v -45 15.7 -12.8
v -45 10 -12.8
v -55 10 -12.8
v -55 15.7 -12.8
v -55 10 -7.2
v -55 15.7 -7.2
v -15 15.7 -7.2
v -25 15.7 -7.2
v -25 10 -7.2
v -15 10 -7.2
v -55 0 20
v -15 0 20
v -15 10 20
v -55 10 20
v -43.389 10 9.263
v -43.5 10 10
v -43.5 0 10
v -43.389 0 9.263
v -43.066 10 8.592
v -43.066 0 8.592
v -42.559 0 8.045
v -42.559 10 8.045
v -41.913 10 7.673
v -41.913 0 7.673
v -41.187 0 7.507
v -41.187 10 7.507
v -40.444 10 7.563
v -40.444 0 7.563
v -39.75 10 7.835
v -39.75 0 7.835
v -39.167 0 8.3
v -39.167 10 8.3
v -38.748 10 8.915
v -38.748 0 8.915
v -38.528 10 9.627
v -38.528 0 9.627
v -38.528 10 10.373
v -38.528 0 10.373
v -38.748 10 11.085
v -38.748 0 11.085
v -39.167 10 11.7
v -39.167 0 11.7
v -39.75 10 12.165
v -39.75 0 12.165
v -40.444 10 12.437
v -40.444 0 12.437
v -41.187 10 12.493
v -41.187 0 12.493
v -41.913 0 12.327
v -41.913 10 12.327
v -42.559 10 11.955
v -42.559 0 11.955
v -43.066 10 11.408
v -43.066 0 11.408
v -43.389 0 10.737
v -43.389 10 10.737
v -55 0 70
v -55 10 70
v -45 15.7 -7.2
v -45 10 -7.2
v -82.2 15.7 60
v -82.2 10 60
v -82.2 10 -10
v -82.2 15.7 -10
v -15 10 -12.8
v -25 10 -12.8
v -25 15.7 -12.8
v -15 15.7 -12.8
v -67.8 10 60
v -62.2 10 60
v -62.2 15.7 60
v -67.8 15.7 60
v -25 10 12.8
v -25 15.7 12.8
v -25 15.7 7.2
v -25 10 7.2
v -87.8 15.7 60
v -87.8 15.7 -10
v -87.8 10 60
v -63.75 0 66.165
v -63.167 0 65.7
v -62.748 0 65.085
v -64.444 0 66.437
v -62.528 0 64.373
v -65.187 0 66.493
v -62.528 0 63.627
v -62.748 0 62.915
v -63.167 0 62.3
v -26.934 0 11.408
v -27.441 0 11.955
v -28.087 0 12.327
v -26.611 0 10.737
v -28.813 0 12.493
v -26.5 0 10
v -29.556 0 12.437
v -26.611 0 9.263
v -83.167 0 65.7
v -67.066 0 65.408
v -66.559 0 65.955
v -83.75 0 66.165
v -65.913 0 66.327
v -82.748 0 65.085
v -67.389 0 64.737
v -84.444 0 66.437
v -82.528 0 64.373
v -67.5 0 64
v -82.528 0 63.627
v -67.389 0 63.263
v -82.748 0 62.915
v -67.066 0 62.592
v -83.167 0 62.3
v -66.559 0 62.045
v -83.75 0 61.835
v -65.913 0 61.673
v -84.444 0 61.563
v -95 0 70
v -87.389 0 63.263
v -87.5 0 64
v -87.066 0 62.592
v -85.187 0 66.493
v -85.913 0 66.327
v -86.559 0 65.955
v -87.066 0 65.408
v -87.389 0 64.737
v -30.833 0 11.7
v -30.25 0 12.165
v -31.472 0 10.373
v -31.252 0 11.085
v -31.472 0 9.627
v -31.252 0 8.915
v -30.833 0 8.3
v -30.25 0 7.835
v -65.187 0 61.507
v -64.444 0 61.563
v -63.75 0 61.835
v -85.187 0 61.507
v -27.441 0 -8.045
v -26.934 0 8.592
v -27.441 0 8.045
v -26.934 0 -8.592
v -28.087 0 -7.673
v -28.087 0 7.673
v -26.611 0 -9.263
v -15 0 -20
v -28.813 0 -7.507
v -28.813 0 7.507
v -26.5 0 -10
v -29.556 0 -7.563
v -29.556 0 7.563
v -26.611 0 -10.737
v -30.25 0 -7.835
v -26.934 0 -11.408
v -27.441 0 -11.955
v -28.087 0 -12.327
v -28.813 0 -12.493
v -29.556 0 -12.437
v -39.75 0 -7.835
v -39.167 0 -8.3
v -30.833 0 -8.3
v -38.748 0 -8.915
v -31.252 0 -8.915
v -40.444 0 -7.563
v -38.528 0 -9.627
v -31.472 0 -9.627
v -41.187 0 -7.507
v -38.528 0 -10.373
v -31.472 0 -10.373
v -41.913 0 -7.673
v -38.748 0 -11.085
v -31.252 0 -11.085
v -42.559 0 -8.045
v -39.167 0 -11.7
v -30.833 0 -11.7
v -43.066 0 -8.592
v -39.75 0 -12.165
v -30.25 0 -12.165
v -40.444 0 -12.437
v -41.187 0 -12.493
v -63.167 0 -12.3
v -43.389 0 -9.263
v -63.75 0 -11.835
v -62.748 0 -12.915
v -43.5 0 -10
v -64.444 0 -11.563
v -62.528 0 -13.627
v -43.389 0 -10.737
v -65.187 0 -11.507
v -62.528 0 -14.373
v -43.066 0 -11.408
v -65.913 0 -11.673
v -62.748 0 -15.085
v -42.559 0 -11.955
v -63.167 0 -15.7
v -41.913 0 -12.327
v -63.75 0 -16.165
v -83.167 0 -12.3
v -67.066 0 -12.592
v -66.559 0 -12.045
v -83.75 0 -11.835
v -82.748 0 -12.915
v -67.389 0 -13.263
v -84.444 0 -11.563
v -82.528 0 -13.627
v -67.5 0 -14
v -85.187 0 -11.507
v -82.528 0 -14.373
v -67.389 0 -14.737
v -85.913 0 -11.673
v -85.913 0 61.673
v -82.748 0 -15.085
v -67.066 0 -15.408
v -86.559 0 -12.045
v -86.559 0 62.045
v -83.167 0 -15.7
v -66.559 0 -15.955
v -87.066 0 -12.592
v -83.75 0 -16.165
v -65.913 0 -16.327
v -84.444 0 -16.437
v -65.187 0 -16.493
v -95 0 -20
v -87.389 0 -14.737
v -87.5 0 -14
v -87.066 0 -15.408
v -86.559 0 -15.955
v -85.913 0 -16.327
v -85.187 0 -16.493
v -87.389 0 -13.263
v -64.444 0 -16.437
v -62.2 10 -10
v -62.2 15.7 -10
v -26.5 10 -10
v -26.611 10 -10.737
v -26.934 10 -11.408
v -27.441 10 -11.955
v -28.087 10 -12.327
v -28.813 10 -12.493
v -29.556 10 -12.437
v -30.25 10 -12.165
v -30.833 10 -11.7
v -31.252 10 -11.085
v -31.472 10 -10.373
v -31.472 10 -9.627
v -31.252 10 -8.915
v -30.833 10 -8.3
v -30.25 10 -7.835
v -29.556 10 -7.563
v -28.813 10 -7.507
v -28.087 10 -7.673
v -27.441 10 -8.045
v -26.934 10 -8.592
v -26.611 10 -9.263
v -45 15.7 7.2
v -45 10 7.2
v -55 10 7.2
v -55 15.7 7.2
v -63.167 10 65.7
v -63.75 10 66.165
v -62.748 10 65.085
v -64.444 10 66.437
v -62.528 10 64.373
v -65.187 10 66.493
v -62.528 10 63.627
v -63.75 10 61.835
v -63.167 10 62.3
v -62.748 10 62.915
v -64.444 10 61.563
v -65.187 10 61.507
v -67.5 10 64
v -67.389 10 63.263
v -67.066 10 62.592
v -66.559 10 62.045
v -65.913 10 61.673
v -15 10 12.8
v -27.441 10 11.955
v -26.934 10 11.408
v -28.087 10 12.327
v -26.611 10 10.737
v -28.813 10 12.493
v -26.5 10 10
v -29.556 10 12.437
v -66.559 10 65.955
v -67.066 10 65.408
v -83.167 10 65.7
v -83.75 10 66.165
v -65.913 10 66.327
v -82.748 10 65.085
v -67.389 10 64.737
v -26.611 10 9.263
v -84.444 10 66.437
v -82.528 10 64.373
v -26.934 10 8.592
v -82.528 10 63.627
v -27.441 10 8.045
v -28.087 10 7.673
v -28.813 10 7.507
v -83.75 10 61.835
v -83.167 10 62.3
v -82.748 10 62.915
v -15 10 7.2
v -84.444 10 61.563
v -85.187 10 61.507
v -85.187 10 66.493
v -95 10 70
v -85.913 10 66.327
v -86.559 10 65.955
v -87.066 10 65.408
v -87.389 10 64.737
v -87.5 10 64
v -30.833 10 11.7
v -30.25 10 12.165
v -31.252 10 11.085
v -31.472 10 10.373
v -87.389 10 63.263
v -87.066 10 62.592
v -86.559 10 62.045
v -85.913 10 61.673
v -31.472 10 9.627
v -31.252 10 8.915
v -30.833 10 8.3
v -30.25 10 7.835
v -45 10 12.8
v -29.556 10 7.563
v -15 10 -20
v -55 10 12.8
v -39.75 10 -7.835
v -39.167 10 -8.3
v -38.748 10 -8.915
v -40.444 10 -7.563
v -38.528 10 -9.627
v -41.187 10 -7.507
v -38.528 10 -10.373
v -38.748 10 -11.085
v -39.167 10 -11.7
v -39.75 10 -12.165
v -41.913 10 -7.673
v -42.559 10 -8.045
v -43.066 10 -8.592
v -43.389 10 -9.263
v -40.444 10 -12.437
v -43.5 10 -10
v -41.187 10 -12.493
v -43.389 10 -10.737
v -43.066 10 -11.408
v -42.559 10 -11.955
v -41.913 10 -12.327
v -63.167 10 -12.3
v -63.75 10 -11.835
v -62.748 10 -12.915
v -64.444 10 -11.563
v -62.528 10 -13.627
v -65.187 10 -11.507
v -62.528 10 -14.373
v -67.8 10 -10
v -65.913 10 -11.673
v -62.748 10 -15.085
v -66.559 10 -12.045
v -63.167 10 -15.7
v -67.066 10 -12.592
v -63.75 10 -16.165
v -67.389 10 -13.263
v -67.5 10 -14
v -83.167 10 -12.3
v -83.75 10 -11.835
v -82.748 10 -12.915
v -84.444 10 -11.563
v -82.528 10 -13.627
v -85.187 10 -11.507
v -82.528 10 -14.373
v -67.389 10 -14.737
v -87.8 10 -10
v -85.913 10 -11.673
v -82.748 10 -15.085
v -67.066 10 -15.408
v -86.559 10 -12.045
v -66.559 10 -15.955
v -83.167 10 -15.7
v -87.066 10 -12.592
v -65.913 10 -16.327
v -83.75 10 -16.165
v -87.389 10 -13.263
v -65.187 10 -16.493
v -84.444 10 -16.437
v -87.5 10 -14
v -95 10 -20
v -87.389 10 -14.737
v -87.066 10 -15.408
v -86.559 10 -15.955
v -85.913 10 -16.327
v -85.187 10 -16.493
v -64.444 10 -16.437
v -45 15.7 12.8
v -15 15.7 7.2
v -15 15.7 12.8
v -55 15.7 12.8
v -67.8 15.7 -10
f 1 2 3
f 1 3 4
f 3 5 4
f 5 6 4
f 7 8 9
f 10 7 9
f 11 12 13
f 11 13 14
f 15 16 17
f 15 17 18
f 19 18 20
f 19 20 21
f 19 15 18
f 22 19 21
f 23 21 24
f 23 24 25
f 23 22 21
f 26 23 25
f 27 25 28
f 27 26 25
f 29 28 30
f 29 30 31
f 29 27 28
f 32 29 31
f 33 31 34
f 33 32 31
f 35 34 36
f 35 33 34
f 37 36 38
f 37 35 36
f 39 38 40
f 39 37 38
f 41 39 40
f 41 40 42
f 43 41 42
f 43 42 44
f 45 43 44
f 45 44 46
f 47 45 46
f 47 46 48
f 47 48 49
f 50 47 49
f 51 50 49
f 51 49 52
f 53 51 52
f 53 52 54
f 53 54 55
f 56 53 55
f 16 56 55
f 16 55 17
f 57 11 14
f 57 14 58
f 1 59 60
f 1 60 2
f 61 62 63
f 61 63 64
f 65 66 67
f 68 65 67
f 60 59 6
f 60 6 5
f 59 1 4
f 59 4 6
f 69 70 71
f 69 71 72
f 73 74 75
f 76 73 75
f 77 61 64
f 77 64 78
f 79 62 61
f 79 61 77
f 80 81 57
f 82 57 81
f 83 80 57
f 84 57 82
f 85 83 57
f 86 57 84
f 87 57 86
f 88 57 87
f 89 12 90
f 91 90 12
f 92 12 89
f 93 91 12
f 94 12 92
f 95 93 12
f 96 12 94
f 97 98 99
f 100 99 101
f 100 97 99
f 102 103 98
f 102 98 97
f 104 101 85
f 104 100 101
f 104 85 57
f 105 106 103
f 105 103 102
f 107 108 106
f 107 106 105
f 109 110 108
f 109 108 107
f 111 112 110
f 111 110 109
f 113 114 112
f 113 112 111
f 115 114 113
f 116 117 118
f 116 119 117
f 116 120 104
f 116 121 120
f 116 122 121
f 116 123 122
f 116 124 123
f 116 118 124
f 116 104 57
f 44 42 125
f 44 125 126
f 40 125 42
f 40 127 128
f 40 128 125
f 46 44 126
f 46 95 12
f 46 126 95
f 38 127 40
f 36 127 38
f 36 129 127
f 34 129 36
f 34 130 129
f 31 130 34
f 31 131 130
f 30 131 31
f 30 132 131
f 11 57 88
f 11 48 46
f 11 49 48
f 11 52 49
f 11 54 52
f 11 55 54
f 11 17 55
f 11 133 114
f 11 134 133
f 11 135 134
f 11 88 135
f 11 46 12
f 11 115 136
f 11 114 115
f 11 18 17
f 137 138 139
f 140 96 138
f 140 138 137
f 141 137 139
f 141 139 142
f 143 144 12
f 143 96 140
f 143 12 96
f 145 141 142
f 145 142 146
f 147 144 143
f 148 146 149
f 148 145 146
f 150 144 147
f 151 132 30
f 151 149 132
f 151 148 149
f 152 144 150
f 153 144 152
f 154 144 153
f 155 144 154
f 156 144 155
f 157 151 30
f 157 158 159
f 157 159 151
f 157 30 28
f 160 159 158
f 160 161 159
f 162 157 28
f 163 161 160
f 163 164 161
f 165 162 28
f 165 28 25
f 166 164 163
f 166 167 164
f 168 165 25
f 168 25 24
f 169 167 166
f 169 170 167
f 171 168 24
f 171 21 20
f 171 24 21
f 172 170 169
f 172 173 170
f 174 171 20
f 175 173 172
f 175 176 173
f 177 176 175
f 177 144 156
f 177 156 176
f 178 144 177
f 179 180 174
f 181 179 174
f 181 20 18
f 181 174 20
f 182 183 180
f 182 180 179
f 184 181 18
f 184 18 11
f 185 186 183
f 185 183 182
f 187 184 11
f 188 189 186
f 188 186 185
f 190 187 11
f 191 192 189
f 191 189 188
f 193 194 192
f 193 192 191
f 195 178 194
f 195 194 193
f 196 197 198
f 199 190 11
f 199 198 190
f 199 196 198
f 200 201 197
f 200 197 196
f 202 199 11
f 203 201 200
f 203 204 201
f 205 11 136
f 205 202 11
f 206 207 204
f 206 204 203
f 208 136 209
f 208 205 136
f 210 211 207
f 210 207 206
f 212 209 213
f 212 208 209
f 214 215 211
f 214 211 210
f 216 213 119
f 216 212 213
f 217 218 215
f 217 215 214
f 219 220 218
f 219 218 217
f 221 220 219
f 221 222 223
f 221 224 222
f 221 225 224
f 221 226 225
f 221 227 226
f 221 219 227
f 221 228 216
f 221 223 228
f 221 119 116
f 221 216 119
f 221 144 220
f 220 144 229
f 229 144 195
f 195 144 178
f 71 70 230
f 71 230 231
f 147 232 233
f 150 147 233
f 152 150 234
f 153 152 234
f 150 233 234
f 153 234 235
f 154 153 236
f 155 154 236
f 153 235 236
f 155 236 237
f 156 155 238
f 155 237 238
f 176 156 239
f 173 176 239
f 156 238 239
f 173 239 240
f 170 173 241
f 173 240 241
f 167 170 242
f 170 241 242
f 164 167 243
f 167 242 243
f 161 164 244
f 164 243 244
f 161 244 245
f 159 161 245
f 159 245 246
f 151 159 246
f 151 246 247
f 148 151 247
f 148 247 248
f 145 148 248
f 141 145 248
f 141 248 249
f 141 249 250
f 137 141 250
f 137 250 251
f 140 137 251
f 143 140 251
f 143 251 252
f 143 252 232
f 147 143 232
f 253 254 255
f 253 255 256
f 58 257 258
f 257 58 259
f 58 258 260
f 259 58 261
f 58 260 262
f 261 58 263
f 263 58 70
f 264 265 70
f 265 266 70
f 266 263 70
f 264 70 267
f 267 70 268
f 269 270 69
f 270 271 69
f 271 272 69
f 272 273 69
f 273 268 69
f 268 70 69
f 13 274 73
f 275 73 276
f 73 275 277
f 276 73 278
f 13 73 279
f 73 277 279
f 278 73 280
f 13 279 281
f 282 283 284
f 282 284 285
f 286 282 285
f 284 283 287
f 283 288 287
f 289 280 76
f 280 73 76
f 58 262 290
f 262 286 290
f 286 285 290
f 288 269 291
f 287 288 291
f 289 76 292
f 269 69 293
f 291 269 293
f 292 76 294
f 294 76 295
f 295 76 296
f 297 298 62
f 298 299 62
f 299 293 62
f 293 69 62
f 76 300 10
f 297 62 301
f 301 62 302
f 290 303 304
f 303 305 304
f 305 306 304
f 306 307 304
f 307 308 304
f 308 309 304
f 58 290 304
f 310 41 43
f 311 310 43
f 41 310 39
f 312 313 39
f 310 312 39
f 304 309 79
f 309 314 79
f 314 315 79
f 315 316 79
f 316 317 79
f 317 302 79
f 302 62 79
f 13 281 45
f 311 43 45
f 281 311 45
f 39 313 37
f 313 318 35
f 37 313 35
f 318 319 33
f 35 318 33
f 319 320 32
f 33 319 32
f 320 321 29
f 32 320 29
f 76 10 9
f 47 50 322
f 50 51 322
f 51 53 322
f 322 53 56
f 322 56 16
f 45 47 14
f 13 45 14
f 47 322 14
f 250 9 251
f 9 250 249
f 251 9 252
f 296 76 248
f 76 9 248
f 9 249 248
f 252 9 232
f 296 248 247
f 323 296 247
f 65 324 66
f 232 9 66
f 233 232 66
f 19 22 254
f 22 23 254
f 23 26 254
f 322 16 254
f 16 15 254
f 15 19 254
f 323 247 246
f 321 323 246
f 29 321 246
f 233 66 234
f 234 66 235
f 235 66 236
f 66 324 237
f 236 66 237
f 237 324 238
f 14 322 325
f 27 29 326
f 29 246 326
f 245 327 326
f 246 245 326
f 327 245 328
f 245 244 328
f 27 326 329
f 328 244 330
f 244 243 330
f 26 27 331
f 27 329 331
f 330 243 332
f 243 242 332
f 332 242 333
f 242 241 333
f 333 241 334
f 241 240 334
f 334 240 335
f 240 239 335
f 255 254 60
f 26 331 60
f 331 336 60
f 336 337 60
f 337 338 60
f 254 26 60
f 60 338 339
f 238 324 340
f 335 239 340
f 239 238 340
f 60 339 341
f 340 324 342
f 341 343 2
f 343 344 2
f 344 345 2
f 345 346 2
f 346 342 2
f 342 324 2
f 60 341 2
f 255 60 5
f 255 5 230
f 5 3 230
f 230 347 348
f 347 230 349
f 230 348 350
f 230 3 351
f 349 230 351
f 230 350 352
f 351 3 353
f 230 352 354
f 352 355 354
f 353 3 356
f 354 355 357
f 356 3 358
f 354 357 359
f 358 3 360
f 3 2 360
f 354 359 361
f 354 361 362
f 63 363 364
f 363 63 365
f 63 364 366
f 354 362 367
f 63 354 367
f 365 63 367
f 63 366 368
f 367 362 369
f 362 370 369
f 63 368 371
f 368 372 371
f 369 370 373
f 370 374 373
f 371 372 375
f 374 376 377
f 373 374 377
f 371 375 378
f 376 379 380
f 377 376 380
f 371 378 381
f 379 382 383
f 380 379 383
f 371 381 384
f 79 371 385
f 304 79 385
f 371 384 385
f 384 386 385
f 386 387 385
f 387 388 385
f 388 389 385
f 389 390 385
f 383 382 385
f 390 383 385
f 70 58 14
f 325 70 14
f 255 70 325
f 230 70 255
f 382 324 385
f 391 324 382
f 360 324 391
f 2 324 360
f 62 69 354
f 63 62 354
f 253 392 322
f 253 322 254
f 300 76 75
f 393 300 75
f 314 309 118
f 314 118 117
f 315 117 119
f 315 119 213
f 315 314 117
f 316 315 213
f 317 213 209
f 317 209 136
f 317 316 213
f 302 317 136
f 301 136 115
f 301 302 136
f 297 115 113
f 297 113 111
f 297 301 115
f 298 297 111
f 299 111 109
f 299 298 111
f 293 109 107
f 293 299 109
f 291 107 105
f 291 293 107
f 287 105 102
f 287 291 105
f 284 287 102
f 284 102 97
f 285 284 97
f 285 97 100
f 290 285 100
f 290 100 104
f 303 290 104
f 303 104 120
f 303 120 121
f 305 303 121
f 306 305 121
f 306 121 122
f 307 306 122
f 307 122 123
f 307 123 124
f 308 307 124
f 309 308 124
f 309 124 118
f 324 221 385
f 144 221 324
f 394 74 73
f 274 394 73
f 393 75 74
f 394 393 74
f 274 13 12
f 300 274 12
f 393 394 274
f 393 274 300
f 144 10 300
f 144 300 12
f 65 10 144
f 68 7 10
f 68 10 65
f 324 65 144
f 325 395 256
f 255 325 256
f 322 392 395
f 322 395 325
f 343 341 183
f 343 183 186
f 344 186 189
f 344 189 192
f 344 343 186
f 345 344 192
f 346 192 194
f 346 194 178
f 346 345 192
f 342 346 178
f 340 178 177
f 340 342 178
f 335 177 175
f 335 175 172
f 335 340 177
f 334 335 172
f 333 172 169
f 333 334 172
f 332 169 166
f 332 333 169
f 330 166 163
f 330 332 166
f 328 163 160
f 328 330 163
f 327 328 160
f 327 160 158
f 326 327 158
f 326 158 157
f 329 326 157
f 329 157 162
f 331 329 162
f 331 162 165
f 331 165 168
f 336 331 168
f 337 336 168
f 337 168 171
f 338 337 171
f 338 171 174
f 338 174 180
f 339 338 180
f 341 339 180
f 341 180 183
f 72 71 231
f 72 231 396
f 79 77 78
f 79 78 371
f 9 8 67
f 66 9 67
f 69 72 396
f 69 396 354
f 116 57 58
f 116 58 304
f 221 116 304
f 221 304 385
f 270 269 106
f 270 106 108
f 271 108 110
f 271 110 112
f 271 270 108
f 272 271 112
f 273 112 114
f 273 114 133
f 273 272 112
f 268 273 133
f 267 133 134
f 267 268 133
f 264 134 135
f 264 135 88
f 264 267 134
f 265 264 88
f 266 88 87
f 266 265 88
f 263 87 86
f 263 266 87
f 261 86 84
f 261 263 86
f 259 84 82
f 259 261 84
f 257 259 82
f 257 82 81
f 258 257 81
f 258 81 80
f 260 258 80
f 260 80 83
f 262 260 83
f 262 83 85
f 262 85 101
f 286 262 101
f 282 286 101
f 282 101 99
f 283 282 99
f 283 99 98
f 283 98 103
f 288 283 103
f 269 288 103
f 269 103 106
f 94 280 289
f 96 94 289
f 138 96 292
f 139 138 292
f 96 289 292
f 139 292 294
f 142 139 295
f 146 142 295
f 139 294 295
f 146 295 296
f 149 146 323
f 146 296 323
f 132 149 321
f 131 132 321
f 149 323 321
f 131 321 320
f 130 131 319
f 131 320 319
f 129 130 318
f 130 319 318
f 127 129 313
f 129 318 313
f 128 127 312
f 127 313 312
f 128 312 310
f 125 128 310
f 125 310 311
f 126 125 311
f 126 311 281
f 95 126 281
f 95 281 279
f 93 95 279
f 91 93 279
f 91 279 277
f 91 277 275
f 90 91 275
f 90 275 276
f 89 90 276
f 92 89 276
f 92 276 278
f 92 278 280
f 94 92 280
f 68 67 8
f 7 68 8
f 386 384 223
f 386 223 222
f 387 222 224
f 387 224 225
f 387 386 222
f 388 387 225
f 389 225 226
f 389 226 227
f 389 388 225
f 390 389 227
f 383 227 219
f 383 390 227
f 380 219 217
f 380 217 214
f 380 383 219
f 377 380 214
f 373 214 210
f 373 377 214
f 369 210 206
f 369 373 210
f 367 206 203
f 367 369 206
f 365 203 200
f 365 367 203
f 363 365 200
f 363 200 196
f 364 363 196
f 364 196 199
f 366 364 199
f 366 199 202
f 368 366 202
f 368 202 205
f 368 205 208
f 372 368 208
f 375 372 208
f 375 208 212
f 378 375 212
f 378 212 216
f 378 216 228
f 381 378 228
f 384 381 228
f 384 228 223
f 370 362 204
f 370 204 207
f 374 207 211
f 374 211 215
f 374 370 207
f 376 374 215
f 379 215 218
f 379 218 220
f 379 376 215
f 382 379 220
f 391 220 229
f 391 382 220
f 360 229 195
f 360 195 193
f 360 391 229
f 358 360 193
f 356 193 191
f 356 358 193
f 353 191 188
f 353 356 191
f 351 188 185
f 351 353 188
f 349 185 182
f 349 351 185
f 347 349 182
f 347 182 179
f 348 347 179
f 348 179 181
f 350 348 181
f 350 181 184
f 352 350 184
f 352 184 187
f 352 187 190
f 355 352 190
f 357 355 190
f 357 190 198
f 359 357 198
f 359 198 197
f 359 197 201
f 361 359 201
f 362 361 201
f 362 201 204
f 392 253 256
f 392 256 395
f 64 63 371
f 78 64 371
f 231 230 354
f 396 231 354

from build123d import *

# Parameters (mm, degrees)
SALIENTE_EXTRUIR1_DEPTH = 10
SALIENTE_EXTRUIR2_DEPTH = 90
SALIENTE_EXTRUIR3_DEPTH = 50
CROQUIS6_W              = 56.928573576
CROQUIS6_H              = 55.923287038
CORTAR_EXTRUIR2_DEPTH   = 30
CROQUIS5_W              = 40
CROQUIS5_H              = 10
CROQUIS5_W_2            = 10
CROQUIS5_H_2            = 40
CORTAR_EXTRUIR1_DEPTH   = 5.7
CROQUIS7_R              = 2.5
CORTAR_EXTRUIR3_DEPTH   = 11
SKETCH1_W               = 156.521822712
SKETCH1_H               = 40.193765496
CUT_EXTRUDE1_DEPTH      = 40


with BuildPart() as part:
    # Croquis1 → Saliente-Extruir1 (new body)
    with BuildSketch(Plane(origin=(0, 0, 0), x_dir=(1, 0, 0), z_dir=(0, 1, 0))):
        Polygon((25, 20), (-65, 20), (-65, -20), (-15, -20), (-15, -70), (25, -70), (25, -20), align=None)
    extrude(amount=SALIENTE_EXTRUIR1_DEPTH)

    # Croquis2 → Saliente-Extruir2 (add, through all)
    with BuildSketch(Plane.XY.offset(70)):
        Polygon((12.2, 9.987376579), (12.2, 15.7), (17.8, 15.7), (17.8, 9.987376579), (15, 9.987376579), align=None)
        Polygon((-7.8, 9.987376579), (-7.8, 15.7), (-2.2, 15.7), (-2.2, 9.987376579), (-5, 9.987376579), align=None)
    extrude(amount=-SALIENTE_EXTRUIR2_DEPTH)

    # Croquis3 → Saliente-Extruir3 (add)
    with BuildSketch(Plane.ZY.offset(65)):
        Polygon((7.2, 10), (7.2, 15.7), (12.8, 15.7), (12.8, 10), (10, 10), align=None)
        Polygon((-12.8, 10), (-12.8, 15.7), (-7.2, 15.7), (-7.2, 10), (-10, 10), align=None)
    extrude(amount=-SALIENTE_EXTRUIR3_DEPTH)

    # Croquis6 → Cortar-Extruir2 (cut)
    with BuildSketch(Plane.ZY.offset(65)):
        Rectangle(CROQUIS6_W, CROQUIS6_H)
    extrude(amount=-CORTAR_EXTRUIR2_DEPTH, mode=Mode.SUBTRACT)

    # Croquis5 → Cortar-Extruir1 (cut)
    with BuildSketch(Plane(origin=(0, 15.7, 0), x_dir=(1, 0, 0), z_dir=(0, 1, 0))):
        with Locations((5, -65)):
            Rectangle(CROQUIS5_W, CROQUIS5_H)
        with Locations((5, 15)):
            Rectangle(CROQUIS5_W, CROQUIS5_H)
        with Locations((-30, 0)):
            Rectangle(CROQUIS5_W_2, CROQUIS5_H_2)
    extrude(amount=-CORTAR_EXTRUIR1_DEPTH, mode=Mode.SUBTRACT)

    # Croquis7 → Cortar-Extruir3 (cut, through all)
    with BuildSketch(Plane(origin=(0, 10, 0), x_dir=(1, 0, 0), z_dir=(0, 1, 0))):
        with Locations((-29, 10)):
            Circle(CROQUIS7_R)
        with Locations((-29, -10)):
            Circle(CROQUIS7_R)
        with Locations((15, 14)):
            Circle(CROQUIS7_R)
        with Locations((-5, 14)):
            Circle(CROQUIS7_R)
        with Locations((-5, -64)):
            Circle(CROQUIS7_R)
        with Locations((15, -64)):
            Circle(CROQUIS7_R)
    extrude(amount=-CORTAR_EXTRUIR3_DEPTH, mode=Mode.SUBTRACT)

    # Mirror1: part across plane


with BuildPart() as part_1:
    add(part.part)
    add(part.part.mirror(Plane.ZY.offset(35)))

    # Sketch1 → Cut-Extrude1 (cut)
    with BuildSketch(Plane(origin=(25, 0, 0), x_dir=(0, 0, -1), z_dir=(1, 0, 0))):
        Rectangle(SKETCH1_W, SKETCH1_H)
    extrude(amount=-CUT_EXTRUDE1_DEPTH, mode=Mode.SUBTRACT)


solid = part_1.part
